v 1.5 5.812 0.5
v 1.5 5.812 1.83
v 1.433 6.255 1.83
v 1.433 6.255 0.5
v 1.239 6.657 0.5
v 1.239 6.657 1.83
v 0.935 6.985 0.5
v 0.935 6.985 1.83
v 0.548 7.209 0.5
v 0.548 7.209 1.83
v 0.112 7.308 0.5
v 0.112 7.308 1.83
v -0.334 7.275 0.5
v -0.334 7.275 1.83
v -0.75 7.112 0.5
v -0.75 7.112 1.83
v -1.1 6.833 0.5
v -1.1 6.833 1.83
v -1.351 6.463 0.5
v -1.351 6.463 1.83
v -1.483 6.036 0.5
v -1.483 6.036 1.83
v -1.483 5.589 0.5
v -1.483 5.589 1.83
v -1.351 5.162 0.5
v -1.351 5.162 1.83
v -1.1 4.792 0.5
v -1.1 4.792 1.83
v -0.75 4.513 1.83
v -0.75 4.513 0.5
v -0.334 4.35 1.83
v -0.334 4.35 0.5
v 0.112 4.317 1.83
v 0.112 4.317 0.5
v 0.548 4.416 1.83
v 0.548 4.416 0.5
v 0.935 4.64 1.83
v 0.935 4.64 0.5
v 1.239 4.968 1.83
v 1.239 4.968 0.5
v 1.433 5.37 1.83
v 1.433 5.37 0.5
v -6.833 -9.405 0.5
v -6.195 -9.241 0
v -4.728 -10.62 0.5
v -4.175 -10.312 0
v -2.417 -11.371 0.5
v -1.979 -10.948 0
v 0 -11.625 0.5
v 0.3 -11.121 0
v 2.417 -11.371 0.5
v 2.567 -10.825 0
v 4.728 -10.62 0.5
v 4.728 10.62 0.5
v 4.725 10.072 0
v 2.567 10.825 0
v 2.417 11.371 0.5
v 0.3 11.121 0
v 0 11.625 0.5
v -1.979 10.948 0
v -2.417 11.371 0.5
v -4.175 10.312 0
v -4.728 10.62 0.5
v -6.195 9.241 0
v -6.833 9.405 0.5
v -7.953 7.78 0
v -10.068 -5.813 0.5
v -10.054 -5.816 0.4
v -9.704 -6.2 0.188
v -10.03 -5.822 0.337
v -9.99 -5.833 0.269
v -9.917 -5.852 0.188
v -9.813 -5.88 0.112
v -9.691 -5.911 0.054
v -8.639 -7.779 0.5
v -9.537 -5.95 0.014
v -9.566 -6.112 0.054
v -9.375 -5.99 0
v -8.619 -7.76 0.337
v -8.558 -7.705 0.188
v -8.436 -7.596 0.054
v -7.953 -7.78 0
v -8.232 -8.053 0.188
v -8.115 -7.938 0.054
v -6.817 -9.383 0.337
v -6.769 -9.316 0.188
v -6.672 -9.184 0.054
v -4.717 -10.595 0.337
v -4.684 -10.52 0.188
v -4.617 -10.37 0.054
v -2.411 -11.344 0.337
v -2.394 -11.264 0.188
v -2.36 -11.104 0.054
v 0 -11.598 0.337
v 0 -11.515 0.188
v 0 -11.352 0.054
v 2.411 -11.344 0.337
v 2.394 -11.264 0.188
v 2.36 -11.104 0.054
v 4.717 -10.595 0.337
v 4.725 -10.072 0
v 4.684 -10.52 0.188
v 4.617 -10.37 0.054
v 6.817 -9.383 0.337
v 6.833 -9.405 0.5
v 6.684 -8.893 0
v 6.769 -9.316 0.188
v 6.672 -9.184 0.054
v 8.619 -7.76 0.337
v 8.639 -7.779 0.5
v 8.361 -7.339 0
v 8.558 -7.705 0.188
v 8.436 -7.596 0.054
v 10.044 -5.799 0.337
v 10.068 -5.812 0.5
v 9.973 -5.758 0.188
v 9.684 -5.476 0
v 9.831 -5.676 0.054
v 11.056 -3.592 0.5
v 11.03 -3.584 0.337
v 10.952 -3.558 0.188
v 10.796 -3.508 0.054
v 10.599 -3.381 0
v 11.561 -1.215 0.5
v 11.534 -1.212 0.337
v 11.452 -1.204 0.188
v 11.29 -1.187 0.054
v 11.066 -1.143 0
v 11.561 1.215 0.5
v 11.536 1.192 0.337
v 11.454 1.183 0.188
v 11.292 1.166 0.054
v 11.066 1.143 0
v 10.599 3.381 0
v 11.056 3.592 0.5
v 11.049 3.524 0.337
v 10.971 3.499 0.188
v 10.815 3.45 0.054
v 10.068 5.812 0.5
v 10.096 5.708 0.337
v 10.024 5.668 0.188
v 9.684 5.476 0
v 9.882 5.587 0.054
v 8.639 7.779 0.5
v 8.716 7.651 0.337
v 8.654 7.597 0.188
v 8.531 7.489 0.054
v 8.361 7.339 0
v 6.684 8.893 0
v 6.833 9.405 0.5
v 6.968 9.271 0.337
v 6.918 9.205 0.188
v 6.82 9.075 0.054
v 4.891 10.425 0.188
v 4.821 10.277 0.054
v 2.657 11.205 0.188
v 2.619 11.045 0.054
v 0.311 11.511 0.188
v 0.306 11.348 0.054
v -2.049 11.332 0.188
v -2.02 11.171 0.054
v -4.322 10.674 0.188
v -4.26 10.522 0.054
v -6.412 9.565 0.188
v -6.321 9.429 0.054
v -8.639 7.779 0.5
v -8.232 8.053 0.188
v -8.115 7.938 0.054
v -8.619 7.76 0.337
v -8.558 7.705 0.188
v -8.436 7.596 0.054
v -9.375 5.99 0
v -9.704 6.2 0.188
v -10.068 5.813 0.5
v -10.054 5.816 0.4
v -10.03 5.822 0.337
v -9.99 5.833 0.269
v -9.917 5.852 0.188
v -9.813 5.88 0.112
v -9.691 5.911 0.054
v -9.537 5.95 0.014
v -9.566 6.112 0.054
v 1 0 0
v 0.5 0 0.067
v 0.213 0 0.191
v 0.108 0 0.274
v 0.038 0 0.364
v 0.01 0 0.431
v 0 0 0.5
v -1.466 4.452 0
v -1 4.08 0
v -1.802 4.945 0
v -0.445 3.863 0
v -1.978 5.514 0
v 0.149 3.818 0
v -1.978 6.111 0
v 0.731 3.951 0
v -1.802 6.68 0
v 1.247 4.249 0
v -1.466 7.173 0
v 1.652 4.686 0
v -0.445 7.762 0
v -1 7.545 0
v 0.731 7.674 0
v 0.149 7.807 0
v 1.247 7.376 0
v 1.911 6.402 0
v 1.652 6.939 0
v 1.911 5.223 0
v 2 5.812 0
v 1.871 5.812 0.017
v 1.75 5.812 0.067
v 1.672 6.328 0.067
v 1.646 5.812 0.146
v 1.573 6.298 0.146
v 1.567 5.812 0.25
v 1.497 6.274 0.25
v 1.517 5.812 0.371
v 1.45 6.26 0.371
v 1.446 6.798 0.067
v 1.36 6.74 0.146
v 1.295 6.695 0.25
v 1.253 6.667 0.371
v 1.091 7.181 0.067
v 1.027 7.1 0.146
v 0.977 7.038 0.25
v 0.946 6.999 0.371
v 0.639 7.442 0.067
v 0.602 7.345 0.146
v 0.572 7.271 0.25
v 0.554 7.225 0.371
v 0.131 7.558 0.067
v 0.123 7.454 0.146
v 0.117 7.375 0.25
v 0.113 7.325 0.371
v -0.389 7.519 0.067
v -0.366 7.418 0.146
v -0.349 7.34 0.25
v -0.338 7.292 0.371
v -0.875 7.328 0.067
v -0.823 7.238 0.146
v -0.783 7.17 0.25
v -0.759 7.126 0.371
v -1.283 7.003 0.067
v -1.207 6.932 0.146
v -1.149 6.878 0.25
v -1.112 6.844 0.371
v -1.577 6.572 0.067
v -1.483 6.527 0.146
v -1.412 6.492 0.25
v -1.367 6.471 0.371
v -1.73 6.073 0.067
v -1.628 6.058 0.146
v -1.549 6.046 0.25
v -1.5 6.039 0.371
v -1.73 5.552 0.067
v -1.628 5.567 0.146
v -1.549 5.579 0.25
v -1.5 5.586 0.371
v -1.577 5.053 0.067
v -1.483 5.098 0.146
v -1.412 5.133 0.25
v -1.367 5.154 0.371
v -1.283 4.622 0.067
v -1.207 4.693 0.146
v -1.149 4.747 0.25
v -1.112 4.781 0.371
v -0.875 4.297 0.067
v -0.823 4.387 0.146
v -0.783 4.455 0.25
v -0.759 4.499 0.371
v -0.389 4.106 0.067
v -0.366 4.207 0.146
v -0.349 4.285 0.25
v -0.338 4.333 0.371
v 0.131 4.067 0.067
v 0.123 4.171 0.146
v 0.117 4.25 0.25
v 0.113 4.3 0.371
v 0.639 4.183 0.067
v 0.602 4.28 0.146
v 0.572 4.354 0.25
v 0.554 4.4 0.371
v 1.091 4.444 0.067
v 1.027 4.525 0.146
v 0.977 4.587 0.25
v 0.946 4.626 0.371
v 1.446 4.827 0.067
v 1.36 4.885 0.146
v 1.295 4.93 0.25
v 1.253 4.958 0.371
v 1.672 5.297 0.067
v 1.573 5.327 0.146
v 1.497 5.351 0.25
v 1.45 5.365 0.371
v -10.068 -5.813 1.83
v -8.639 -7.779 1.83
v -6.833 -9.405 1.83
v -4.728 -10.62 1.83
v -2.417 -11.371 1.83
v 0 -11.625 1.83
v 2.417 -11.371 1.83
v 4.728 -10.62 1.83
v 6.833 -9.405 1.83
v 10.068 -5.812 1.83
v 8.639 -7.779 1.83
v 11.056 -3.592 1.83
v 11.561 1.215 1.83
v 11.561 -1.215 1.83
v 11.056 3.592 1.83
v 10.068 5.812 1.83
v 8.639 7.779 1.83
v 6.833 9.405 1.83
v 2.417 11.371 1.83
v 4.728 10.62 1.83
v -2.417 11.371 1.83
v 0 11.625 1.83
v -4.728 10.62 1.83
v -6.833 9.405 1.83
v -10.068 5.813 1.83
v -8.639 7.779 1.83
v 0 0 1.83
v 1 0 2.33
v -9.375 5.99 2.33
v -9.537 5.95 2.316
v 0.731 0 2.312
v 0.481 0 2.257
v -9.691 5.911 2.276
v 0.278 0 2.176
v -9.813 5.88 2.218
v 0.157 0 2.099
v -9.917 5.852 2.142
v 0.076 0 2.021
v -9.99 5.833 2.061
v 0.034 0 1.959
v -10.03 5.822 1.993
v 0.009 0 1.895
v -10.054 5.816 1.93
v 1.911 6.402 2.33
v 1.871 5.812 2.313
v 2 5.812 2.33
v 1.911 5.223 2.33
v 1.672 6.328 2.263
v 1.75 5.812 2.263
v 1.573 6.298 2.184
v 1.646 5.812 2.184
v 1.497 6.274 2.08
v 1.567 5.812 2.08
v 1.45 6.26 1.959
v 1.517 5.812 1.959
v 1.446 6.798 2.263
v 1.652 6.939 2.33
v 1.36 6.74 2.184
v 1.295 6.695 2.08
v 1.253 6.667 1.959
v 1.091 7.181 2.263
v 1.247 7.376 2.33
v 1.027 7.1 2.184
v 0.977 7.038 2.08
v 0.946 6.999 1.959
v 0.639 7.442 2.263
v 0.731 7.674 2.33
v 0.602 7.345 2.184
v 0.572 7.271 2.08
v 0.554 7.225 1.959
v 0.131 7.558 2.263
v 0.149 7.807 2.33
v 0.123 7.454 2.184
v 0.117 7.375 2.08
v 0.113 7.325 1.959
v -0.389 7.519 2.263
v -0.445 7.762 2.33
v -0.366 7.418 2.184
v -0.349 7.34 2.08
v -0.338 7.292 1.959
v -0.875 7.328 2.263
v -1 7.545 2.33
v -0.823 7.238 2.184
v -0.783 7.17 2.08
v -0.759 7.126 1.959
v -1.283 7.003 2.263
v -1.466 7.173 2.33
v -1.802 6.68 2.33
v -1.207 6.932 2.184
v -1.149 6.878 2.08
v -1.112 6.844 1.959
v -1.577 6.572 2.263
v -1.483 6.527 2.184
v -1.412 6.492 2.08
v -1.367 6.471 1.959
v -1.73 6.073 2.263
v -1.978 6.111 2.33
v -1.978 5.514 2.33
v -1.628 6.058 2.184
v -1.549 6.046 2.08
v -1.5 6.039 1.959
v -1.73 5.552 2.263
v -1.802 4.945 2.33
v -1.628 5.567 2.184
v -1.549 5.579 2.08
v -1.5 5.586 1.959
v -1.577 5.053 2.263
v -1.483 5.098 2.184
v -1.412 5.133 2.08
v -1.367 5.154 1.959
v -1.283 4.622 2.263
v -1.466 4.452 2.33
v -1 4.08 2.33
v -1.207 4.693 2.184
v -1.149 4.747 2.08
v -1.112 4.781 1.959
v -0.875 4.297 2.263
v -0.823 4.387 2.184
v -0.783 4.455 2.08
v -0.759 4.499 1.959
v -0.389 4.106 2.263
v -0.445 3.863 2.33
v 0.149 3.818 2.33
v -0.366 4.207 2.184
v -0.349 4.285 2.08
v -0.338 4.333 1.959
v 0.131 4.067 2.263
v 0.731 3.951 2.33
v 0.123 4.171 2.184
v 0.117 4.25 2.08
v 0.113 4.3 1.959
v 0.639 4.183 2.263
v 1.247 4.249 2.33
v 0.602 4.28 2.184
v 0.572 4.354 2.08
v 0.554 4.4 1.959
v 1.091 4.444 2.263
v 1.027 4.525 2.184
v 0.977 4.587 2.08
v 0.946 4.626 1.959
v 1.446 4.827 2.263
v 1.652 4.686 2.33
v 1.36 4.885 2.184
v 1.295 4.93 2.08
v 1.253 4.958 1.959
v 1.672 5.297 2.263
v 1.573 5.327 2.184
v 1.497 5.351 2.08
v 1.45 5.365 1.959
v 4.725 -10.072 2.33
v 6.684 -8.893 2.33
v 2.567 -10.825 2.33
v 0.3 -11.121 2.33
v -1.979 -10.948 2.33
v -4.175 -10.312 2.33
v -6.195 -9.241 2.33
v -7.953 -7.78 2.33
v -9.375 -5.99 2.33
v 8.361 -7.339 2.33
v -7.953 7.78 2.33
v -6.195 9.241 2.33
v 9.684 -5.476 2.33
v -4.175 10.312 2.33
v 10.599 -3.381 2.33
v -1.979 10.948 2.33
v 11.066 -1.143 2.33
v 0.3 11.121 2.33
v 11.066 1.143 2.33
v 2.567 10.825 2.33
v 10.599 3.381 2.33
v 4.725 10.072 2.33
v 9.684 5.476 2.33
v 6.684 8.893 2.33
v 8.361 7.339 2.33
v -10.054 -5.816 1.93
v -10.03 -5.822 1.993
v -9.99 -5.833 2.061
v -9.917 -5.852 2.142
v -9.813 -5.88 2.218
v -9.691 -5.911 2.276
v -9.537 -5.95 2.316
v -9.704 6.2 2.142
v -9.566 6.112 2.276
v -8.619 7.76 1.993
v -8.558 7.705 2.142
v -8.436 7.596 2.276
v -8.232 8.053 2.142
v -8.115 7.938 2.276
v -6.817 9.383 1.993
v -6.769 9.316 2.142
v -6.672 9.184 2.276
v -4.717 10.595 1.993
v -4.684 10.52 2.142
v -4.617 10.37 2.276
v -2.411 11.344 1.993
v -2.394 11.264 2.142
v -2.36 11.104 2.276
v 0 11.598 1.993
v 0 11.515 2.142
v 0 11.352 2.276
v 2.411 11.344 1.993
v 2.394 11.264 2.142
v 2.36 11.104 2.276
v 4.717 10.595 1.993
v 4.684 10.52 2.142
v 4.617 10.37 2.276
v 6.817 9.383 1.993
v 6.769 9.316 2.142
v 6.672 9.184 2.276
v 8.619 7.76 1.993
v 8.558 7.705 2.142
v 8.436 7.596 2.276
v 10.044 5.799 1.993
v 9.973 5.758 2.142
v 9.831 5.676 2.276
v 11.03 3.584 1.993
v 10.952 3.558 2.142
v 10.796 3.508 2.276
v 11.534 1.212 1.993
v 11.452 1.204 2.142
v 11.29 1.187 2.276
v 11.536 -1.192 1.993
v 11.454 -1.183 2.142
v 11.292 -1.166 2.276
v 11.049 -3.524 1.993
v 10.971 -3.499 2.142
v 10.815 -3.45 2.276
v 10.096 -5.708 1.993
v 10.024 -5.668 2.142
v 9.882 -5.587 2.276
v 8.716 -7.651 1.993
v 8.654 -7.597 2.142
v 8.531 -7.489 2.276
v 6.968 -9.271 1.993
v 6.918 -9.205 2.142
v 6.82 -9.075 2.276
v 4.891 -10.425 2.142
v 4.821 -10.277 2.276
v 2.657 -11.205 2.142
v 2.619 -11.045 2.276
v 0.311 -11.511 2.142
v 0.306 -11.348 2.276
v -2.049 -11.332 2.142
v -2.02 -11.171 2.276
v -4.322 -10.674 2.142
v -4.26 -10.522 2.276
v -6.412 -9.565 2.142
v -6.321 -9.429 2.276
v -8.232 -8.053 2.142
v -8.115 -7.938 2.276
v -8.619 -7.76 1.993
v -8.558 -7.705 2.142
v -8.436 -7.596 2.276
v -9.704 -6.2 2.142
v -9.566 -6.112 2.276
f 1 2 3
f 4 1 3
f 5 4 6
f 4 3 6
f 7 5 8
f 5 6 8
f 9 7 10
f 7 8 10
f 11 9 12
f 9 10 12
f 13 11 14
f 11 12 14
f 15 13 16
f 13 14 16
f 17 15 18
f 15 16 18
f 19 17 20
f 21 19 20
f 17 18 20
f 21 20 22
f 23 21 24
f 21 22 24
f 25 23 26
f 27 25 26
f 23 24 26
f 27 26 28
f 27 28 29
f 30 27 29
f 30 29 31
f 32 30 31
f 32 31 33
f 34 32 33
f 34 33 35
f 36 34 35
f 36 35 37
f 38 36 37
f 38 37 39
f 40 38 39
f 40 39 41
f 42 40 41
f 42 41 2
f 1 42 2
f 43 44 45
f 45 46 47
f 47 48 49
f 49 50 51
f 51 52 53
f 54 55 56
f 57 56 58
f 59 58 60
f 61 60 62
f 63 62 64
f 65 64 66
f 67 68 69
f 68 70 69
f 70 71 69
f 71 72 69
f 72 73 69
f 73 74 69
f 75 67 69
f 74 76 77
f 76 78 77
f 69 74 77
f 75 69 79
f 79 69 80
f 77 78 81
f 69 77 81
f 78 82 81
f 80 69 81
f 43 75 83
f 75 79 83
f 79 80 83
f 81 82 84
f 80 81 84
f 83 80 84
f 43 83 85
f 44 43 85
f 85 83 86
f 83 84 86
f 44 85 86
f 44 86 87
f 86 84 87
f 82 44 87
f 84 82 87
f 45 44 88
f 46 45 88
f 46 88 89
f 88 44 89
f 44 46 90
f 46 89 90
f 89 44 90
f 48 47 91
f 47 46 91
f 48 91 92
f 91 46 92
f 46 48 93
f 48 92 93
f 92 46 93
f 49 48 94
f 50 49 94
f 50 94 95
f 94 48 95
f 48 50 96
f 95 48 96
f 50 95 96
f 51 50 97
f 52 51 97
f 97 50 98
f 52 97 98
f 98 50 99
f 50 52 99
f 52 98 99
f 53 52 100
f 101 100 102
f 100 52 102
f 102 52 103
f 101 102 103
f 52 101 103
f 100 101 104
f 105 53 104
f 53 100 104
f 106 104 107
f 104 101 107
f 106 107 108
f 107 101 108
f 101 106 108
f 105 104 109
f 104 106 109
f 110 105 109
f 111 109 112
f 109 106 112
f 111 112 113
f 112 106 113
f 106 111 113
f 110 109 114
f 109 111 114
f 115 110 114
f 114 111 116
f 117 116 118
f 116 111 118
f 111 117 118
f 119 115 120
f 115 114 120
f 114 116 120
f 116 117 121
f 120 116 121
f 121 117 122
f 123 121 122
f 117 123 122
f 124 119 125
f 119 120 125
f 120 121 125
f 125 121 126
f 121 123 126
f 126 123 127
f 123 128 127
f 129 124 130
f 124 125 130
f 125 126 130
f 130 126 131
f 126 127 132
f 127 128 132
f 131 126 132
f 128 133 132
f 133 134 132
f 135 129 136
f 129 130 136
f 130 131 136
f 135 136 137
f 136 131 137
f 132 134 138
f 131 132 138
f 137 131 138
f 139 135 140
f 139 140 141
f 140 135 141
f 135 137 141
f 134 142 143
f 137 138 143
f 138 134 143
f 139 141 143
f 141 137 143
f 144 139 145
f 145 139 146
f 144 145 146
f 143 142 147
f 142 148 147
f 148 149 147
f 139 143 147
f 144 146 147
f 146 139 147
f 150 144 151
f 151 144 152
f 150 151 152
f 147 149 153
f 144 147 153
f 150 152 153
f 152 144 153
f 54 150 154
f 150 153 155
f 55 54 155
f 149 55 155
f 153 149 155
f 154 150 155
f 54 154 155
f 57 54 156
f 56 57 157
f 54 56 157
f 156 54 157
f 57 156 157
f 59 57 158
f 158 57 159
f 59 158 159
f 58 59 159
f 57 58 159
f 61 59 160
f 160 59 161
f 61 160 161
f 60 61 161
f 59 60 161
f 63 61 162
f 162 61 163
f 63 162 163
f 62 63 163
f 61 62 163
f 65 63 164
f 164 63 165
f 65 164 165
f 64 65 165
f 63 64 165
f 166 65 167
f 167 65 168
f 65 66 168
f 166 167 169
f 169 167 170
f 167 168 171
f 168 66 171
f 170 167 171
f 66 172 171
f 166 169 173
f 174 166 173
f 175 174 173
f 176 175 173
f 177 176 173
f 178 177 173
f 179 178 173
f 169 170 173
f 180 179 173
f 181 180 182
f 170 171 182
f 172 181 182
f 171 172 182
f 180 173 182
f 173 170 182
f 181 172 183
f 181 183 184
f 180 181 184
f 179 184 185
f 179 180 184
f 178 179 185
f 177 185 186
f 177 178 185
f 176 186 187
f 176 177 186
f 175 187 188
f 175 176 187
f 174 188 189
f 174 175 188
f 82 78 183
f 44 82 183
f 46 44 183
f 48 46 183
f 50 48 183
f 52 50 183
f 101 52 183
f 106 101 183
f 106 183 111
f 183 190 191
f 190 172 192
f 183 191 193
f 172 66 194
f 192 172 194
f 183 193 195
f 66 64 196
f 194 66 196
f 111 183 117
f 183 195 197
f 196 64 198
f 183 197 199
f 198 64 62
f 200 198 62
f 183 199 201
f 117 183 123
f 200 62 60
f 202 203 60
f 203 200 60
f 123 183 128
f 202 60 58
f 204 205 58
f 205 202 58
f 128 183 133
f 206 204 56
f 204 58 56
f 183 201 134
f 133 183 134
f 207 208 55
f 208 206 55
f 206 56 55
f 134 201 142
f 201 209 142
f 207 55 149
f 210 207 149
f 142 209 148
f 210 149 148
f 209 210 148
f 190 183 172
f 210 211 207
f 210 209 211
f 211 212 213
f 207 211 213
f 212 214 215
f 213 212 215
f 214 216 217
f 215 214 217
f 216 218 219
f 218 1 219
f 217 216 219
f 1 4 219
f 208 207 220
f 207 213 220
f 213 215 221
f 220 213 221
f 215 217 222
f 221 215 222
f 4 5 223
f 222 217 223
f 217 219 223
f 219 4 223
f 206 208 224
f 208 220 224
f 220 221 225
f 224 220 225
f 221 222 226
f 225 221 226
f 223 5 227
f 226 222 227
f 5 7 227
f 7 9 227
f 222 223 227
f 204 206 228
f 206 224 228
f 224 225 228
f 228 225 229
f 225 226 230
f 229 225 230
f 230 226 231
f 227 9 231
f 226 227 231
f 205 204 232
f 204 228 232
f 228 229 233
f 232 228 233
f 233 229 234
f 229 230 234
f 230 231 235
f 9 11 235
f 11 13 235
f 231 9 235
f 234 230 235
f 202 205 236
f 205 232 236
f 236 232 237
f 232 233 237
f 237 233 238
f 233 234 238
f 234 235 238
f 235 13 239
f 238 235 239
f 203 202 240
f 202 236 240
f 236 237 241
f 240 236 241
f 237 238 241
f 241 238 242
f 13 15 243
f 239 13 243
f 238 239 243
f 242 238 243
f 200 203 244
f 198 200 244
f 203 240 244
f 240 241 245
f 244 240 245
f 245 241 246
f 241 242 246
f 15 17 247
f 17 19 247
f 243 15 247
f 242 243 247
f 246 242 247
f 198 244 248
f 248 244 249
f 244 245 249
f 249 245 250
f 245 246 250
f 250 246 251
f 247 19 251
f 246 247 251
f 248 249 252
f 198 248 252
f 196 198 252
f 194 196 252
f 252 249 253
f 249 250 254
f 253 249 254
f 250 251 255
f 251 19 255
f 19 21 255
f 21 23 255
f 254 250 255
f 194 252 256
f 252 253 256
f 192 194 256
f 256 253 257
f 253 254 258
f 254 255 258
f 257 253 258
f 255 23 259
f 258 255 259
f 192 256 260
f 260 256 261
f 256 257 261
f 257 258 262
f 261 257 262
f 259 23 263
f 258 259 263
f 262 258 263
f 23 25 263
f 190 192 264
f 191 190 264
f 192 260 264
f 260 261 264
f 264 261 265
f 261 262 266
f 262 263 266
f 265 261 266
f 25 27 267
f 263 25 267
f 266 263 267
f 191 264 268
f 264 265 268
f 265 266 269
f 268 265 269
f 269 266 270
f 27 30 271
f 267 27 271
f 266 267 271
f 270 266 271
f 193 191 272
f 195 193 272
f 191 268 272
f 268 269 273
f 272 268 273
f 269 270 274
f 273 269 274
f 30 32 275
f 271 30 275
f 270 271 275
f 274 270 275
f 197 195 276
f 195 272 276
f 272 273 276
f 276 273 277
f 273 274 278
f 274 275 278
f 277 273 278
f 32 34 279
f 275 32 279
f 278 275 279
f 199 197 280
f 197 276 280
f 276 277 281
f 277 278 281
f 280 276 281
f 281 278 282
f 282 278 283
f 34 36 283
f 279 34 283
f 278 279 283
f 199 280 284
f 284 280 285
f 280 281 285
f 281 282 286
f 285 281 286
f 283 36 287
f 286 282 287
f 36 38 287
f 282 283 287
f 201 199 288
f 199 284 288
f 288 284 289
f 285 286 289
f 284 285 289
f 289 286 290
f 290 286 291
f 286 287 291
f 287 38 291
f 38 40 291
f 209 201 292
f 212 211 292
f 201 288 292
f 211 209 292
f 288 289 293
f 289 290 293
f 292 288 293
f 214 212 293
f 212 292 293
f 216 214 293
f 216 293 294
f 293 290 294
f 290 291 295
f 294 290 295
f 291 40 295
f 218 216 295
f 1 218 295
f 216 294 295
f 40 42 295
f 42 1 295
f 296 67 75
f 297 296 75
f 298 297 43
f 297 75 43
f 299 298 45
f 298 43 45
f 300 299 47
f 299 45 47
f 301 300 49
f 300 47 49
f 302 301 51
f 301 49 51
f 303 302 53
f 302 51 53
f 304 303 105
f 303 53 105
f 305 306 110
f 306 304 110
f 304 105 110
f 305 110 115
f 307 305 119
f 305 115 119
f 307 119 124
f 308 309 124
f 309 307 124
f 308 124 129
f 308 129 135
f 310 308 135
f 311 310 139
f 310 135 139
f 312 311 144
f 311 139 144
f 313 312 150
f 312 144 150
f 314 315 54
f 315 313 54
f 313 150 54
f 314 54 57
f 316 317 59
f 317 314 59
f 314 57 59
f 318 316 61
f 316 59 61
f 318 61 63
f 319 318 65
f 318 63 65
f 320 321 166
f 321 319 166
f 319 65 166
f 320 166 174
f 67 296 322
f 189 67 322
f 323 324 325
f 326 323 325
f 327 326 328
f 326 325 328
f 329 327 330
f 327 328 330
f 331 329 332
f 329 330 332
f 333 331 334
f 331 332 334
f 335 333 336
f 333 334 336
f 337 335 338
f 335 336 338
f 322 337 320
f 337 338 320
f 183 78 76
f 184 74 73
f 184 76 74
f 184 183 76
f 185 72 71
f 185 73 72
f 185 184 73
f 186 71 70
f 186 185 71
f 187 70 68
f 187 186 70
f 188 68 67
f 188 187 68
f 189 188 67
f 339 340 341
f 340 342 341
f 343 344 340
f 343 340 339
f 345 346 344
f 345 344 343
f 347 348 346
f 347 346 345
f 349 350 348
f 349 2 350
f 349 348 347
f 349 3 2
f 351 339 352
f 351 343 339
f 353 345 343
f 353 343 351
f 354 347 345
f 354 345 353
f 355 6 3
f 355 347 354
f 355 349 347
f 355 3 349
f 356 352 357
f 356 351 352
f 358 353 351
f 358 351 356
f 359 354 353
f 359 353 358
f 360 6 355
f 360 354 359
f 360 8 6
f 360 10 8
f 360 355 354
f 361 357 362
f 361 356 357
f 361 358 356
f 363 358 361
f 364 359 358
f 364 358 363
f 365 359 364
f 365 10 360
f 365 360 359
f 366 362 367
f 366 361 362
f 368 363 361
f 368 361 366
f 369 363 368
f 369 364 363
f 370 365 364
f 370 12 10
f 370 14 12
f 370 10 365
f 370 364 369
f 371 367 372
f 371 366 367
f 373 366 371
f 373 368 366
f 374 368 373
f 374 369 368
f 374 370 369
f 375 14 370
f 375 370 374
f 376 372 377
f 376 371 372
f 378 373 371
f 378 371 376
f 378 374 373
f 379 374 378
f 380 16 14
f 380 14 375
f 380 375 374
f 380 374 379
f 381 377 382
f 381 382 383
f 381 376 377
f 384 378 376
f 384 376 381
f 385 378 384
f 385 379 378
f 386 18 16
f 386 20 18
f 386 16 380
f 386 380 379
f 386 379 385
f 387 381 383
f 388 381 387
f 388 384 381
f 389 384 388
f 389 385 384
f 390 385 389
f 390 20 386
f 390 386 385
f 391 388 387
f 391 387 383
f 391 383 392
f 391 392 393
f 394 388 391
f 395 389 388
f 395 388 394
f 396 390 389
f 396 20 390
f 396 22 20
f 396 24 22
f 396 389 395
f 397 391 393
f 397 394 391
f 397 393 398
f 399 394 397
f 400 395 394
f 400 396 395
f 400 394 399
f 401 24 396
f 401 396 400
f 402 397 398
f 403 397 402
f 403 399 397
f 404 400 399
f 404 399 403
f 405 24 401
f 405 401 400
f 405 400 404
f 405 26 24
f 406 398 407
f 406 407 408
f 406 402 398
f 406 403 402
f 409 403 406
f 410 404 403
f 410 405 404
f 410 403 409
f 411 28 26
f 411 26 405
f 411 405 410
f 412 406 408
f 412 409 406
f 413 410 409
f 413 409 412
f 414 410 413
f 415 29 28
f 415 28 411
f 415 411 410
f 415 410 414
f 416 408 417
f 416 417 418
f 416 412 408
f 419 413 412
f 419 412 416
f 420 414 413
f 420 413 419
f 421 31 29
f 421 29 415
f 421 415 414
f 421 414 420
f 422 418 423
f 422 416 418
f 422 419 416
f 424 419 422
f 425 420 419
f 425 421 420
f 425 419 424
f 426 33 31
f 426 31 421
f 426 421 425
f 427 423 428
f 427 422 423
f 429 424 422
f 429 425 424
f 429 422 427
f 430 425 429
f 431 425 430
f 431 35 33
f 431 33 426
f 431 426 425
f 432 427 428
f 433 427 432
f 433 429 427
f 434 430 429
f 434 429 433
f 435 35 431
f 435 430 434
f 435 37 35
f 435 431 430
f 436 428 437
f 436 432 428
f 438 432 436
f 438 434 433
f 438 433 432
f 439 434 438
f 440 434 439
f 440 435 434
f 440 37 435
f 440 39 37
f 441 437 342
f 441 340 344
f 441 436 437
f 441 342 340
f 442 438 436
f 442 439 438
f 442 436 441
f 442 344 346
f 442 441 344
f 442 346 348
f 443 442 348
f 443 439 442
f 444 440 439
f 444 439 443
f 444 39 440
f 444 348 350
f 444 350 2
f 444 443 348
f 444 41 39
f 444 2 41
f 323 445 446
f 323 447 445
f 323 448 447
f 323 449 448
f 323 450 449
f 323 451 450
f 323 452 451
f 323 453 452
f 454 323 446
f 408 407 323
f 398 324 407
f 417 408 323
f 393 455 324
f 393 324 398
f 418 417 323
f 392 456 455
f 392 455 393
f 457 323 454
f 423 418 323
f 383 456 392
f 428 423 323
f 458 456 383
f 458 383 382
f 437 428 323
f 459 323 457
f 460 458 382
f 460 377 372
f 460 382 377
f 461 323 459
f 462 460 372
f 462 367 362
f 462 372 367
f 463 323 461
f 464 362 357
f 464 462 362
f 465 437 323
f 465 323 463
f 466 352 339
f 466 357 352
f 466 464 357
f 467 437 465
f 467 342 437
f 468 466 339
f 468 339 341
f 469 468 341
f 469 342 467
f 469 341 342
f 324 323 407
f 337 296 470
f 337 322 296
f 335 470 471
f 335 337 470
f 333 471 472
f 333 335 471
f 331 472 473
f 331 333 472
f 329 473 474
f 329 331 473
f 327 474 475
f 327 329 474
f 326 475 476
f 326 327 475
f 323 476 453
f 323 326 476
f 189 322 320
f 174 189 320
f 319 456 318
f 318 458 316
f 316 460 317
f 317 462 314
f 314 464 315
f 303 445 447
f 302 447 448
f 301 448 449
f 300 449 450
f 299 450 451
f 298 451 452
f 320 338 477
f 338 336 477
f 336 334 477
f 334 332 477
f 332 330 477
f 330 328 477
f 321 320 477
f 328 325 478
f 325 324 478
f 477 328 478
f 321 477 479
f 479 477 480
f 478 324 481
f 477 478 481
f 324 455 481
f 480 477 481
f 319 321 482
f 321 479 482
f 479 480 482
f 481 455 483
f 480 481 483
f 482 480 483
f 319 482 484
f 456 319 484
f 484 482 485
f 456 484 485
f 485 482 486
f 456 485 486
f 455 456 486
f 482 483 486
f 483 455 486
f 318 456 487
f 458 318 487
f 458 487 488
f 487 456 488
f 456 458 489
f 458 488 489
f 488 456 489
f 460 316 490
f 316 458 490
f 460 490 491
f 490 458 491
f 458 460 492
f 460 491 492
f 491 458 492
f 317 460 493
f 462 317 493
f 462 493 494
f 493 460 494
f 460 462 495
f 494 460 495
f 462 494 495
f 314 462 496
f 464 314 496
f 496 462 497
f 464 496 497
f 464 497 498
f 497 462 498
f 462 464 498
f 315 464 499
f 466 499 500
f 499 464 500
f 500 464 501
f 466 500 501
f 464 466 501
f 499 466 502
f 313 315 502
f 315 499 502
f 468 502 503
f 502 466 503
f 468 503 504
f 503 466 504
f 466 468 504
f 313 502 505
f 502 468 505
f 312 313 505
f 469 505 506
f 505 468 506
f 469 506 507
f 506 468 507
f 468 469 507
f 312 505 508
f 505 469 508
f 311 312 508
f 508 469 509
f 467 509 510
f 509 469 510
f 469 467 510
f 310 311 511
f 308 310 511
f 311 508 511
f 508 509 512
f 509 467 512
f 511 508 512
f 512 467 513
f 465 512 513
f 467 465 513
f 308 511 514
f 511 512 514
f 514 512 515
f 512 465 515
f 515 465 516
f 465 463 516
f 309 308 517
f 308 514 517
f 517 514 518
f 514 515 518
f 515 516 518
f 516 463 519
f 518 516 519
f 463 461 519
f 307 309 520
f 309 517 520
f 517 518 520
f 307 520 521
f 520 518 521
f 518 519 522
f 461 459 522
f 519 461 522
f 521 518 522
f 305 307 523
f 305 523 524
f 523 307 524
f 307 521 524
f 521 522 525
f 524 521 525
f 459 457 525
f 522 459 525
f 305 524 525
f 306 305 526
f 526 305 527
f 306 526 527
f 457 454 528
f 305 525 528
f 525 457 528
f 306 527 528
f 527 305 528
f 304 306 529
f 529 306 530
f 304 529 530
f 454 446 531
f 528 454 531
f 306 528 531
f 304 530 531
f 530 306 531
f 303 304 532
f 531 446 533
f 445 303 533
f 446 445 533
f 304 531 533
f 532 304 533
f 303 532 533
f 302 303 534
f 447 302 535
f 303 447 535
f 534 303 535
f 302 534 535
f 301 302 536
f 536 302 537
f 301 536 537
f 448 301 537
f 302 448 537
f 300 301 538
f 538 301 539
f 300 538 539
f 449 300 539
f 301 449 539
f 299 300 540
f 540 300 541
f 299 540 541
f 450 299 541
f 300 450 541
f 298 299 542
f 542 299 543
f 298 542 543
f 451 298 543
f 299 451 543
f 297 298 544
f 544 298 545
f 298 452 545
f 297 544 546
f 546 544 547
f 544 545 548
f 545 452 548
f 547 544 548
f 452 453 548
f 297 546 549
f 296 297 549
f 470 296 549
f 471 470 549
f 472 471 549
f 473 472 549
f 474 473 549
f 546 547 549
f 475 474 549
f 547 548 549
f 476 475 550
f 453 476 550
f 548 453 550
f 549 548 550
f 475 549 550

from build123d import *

# Parameters (mm, degrees)
F0_R     = 11.625
F1_DEPTH = 2.33
F3_DEPTH = 2.331
F4_R     = 1.5
F5_DEPTH = 2.331
F6_R     = 0.5


with BuildPart() as f1:
    # F0 (on Top) → F1 (new body)
    with BuildSketch(Plane.XY):
        Circle(F0_R)
    extrude(amount=F1_DEPTH)

    # F2 (on face) → F3 (cut, through all)
    with BuildSketch(Plane.XY.offset(2.33)):
        with BuildLine():
            Line((-10.067545, -5.8125), (0, 0))
            Line((0, 0), (-10.067545, 5.8125))
            ThreePointArc((-10.067545, 5.8125), (-11.625, 0), (-10.067545, -5.8125))
        make_face()
    extrude(amount=-F3_DEPTH, mode=Mode.SUBTRACT)

    # F4 (on face) → F5 (cut, through all)
    with BuildSketch(Plane.XY.offset(2.33)):
        with Locations((0, 5.8125)):
            Circle(F4_R)
    extrude(amount=-F5_DEPTH, mode=Mode.SUBTRACT)

    # F6
    f6_edges = [f1.edges().sort_by_distance(p)[0] for p in [
        (11.625, 0, 2.33),
        (11.625, 0, 0),
        (-5.033773, -2.90625, 2.33),
        (-5.033773, 2.90625, 2.33),
        (-5.033773, -2.90625, 0),
        (-5.033773, 2.90625, 0),
        (-1.5, 5.8125, 0),
        (-1.5, 5.8125, 2.33),
    ]]
    fillet(f6_edges, radius=F6_R)


solid = f1.part
